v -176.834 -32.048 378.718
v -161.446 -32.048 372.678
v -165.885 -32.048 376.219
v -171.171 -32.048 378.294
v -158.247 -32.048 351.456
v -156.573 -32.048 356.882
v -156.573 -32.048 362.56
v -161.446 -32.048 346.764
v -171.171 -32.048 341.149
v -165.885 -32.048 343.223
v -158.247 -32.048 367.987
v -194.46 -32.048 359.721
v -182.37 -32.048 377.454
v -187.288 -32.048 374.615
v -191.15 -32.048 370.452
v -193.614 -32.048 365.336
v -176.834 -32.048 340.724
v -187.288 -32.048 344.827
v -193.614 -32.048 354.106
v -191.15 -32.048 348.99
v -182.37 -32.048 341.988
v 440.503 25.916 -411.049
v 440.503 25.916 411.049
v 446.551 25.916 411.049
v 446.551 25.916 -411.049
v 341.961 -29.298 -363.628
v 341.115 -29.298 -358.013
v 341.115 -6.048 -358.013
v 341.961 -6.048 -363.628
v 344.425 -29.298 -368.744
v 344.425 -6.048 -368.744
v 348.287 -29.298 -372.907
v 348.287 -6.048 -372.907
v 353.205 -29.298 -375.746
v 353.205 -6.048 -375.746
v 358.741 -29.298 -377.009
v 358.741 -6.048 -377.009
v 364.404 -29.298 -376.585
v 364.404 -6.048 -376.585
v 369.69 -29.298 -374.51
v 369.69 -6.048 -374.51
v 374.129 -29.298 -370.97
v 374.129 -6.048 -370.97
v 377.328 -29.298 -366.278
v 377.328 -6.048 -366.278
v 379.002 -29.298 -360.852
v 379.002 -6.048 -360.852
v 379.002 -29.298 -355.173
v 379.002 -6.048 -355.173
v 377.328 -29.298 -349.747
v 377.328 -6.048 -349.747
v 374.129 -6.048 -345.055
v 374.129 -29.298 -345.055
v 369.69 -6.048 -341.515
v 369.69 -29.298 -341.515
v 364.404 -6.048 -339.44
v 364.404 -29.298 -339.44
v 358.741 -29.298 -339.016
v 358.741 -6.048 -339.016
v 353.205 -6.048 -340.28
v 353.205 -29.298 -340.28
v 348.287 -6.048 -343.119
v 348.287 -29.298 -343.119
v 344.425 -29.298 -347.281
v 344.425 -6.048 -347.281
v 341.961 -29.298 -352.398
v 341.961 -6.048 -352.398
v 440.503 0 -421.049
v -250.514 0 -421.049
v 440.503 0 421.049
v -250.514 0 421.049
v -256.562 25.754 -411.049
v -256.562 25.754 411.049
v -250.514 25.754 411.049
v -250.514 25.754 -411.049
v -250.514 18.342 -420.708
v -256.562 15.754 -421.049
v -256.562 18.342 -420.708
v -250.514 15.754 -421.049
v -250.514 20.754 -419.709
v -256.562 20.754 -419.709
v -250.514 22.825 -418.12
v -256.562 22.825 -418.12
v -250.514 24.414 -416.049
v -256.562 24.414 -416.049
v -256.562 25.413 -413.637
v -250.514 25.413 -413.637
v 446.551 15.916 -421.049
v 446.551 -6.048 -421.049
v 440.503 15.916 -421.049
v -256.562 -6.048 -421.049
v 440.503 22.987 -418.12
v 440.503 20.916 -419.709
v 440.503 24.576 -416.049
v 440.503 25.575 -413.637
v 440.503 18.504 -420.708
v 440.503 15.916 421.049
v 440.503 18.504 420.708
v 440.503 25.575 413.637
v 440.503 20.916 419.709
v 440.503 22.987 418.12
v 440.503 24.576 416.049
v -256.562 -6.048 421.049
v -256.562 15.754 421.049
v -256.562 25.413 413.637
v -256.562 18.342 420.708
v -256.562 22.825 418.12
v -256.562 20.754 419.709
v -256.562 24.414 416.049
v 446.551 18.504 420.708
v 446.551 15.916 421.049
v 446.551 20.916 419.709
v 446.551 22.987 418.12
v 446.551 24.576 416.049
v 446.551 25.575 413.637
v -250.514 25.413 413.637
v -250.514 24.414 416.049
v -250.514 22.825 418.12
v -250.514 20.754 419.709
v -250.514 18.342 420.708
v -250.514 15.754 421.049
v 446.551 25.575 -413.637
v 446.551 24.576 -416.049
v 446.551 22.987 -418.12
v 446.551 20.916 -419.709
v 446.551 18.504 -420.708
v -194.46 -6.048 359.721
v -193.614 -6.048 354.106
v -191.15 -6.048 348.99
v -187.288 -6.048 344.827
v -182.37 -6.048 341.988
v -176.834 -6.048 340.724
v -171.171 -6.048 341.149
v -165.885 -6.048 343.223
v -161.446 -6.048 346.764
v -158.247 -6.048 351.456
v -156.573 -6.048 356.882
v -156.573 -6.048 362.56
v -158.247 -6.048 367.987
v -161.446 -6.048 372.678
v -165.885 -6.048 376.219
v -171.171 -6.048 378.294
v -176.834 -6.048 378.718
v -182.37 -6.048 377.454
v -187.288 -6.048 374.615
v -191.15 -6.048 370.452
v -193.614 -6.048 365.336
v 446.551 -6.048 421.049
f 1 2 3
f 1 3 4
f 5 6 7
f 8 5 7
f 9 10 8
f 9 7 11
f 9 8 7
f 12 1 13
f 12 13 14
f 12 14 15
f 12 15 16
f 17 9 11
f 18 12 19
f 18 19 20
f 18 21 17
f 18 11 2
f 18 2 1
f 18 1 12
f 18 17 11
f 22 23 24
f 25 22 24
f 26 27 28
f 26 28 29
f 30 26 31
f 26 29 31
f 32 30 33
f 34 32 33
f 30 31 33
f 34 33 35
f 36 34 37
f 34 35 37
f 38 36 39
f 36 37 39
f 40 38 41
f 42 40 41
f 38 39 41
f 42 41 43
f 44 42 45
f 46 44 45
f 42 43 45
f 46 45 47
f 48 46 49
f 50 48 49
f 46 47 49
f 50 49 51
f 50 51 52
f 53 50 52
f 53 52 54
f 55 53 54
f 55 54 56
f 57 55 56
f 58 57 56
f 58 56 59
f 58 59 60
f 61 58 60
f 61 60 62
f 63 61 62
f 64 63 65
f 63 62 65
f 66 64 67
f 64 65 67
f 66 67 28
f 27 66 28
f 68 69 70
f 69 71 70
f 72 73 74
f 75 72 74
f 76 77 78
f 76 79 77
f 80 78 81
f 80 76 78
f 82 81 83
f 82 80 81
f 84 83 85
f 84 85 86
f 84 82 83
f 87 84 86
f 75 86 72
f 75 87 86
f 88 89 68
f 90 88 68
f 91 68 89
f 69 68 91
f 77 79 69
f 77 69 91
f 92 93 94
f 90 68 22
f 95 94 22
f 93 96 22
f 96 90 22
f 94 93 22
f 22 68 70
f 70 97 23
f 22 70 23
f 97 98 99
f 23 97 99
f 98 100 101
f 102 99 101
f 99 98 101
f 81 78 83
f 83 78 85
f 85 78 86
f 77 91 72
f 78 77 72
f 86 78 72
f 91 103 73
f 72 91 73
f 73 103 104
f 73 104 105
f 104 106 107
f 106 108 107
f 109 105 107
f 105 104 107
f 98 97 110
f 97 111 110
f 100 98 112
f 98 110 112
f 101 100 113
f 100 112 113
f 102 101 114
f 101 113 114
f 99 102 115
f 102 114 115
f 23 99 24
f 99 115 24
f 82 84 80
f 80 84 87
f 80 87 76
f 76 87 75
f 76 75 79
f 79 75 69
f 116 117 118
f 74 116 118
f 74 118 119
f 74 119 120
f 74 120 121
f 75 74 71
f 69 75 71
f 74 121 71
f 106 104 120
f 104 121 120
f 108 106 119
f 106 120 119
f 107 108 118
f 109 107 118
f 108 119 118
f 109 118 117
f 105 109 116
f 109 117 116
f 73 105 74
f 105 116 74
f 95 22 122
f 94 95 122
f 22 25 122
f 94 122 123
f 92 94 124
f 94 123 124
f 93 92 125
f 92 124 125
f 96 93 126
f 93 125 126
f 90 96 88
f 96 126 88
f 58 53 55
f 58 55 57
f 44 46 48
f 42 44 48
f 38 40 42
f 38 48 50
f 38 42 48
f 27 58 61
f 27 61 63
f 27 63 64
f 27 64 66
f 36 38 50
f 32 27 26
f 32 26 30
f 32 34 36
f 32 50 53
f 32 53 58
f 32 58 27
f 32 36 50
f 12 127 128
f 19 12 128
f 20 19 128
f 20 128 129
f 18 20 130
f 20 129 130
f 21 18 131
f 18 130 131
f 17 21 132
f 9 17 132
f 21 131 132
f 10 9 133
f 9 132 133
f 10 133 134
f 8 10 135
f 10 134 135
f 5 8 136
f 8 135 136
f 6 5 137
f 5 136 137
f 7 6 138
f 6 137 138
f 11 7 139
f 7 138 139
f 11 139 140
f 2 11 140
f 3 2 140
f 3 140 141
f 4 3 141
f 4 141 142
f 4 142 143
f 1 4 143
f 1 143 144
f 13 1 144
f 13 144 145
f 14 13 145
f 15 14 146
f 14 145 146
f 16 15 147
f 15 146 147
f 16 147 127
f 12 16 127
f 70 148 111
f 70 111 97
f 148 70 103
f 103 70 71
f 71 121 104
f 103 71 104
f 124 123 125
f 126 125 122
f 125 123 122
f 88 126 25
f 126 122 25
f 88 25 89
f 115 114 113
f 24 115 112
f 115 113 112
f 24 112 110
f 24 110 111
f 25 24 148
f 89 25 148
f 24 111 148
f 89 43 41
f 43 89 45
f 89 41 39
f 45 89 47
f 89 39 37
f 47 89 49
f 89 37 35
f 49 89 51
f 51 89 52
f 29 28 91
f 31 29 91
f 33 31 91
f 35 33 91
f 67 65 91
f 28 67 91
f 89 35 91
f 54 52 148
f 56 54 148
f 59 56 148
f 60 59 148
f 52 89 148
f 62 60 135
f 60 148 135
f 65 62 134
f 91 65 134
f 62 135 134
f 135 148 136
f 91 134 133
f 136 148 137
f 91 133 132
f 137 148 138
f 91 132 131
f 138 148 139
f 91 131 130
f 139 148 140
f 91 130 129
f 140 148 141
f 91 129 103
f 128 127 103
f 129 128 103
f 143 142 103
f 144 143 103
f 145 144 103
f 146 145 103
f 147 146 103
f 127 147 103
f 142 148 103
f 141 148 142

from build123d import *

# Parameters (mm, degrees)
EXTRUDE_THIN1_DEPTH = 421.049210887
FILLET1_R           = 10
SKETCH_2_R          = 19.05
EXTRUDE_1_DEPTH     = 23.24974156
SKETCH_3_R          = 19.05
EXTRUDE_2_DEPTH     = 26


with BuildPart() as part:
    # Sketch1 → Extrude-Thin1 (new body, symmetric)
    with BuildSketch(Plane.XY):
        Polygon((-250.514148937, 25.753634758), (-250.514148937, 0), (440.503291061, 0), (440.503291061, 25.915671281), (446.551474959, 25.915671281), (446.551474959, -6.048183898), (-256.562332835, -6.048183898), (-256.562332835, 25.753634758), align=None)
    extrude(amount=EXTRUDE_THIN1_DEPTH, both=True)

    # Fillet1
    fillet1_edges = [part.edges().sort_by_distance(p)[0] for p in [
        (-253.538240886, 25.753634758, 421.049210887),
        (443.52738301, 25.915671281, 421.049210887),
        (-253.538240886, 25.753634758, -421.049210887),
        (443.52738301, 25.915671281, -421.049210887),
    ]]
    fillet(fillet1_edges, radius=FILLET1_R)

    # 草图2 → 凸台-拉伸1 (add)
    with BuildSketch(Plane(origin=(0, -6.048183898, 0), x_dir=(-1, 0, 0), z_dir=(0, -1, 0))):
        with Locations((-360.164689426, 358.012657815)):
            Circle(SKETCH_2_R)
    extrude(amount=EXTRUDE_1_DEPTH)

    # 草图3 → 凸台-拉伸2 (add)
    with BuildSketch(Plane(origin=(0, -6.048183898, 0), x_dir=(-1, 0, 0), z_dir=(0, -1, 0))):
        with Locations((175.410326922, -359.721177401)):
            Circle(SKETCH_3_R)
    extrude(amount=EXTRUDE_2_DEPTH)


solid = part.part
